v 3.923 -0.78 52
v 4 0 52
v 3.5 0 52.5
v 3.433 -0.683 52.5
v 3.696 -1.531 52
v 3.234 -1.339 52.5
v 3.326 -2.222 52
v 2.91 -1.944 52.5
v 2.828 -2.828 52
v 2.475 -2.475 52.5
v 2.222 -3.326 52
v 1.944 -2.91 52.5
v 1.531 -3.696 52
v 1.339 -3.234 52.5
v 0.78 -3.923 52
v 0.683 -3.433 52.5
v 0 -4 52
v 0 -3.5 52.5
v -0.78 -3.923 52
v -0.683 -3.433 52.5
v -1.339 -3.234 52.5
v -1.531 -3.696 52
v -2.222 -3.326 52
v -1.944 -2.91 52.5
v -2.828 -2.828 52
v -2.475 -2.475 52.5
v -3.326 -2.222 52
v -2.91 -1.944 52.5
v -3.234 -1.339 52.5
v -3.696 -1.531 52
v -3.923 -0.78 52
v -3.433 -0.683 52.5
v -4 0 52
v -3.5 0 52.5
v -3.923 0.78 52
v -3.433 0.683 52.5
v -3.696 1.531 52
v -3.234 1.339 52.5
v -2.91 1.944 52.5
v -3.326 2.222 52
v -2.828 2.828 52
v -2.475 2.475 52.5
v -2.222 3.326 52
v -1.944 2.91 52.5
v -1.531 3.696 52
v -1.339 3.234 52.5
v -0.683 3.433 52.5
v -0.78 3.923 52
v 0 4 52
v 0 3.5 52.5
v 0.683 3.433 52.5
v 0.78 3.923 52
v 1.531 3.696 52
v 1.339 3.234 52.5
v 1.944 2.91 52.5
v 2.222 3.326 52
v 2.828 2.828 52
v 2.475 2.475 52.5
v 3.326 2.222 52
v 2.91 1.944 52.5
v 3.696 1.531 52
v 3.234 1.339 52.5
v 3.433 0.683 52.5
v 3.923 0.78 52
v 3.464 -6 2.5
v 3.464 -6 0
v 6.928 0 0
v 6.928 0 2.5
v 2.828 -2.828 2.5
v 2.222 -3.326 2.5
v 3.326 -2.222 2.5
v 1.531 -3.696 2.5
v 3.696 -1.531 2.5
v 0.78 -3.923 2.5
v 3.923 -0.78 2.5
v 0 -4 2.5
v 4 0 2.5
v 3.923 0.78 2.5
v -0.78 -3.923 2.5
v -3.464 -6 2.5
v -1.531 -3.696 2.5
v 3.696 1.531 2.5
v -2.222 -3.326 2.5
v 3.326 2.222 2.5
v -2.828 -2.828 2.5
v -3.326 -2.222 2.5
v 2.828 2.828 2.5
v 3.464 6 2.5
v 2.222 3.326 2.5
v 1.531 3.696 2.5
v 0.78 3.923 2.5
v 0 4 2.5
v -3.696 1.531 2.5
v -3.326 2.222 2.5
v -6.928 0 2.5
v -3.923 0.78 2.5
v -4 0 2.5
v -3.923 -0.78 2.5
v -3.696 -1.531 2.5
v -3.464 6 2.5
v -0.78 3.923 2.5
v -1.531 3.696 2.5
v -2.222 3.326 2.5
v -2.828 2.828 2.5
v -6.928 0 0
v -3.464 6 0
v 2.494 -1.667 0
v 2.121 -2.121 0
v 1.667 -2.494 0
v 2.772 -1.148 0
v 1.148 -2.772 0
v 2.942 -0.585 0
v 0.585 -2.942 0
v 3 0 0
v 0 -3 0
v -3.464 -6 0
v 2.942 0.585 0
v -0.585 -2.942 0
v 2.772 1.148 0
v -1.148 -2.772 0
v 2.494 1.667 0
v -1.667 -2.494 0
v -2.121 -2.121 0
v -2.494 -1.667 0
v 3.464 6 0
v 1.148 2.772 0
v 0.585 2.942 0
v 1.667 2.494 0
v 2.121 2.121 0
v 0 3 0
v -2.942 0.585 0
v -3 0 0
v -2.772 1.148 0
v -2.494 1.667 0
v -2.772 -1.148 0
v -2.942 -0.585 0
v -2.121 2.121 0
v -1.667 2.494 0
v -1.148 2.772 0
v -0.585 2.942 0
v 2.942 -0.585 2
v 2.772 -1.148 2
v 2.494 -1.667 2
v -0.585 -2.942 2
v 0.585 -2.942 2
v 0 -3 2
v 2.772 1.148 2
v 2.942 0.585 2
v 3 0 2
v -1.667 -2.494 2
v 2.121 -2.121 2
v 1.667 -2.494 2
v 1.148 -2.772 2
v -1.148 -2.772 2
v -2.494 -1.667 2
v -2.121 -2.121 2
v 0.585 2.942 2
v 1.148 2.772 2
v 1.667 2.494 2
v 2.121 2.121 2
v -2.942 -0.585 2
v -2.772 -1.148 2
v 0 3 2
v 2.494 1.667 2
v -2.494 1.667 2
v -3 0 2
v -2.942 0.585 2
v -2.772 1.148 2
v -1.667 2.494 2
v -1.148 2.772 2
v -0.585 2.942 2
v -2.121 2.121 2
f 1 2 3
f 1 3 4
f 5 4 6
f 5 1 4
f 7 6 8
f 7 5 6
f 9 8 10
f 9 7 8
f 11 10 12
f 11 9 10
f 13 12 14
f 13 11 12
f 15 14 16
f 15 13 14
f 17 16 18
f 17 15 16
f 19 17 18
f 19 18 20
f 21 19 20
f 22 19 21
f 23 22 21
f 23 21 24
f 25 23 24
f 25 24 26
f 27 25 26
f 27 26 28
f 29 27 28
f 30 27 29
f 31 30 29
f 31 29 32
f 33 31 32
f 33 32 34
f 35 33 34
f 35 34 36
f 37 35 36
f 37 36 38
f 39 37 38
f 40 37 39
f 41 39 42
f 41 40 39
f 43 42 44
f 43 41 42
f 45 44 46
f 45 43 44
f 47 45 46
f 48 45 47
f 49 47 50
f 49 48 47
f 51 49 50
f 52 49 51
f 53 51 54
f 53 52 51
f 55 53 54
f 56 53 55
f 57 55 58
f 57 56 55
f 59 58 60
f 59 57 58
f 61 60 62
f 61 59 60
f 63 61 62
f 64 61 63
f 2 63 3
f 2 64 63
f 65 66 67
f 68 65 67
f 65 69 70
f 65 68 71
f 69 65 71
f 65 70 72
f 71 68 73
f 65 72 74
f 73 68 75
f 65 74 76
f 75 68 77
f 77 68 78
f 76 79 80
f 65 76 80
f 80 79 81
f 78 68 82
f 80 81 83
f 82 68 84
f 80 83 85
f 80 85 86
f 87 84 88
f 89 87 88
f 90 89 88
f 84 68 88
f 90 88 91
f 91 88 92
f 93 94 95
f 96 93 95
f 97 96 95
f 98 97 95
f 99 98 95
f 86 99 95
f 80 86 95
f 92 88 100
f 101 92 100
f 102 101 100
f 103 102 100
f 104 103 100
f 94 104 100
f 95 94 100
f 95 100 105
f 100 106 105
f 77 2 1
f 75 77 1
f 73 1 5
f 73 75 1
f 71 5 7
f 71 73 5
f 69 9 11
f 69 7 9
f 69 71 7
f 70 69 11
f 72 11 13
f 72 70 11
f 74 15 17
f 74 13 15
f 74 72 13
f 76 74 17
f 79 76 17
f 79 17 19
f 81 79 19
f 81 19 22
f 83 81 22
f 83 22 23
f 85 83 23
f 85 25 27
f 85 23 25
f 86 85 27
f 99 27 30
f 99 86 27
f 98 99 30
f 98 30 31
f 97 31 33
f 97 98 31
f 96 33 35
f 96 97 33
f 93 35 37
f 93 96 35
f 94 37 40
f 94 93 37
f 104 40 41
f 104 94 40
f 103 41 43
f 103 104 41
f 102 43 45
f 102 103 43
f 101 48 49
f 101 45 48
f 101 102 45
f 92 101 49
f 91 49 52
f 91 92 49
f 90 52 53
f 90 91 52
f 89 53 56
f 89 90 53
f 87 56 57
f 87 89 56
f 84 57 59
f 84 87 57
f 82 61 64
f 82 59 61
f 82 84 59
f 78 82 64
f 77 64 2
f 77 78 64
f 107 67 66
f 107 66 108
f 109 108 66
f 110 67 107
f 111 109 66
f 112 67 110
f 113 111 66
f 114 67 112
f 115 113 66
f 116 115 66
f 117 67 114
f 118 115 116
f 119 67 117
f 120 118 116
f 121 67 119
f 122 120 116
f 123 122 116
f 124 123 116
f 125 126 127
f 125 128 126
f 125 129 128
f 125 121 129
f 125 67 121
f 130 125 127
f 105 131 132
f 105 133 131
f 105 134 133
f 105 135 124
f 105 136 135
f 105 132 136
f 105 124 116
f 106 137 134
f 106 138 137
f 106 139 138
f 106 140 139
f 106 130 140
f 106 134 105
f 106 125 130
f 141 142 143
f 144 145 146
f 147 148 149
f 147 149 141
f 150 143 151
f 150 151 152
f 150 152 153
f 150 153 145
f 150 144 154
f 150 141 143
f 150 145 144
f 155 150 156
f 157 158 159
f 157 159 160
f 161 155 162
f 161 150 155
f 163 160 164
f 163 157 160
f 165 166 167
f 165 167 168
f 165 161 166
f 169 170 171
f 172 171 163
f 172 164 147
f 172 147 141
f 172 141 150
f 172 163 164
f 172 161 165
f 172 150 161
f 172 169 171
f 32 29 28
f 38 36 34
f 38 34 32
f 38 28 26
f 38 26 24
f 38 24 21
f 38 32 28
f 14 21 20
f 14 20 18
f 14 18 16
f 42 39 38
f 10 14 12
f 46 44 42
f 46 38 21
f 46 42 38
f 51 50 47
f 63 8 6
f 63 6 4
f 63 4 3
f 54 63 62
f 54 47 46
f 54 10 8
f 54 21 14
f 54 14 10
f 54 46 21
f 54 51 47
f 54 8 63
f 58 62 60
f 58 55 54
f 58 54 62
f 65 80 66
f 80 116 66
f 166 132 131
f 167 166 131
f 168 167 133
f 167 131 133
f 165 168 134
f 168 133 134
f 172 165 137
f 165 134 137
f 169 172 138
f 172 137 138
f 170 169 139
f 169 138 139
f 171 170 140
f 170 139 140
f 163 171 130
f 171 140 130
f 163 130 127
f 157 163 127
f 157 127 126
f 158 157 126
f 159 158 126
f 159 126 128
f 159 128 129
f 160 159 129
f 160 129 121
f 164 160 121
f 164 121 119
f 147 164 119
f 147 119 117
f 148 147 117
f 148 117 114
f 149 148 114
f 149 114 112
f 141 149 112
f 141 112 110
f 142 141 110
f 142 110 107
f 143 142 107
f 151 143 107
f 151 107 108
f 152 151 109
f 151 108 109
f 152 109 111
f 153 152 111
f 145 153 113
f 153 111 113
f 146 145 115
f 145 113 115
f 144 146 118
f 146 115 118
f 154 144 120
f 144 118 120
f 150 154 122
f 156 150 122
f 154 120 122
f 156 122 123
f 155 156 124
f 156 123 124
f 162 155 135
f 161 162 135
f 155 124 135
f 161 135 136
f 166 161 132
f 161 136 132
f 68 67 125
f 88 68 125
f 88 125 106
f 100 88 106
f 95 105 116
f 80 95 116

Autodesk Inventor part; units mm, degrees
ref_plane "YZ Plane" through (0, 0, 0) normal (1, 0, 0) x (0, 1, 0)
ref_plane "XZ Plane" through (0, 0, 0) normal (0, 1, 0) x (-1, 0, 0)
ref_plane "XY Plane" through (0, 0, 0) normal (0, 0, 1) x (1, 0, 0)
sketch "Skizze1" plane through (0, 0, 0) normal (0, 0, 1) x (1, 0, 0)
  circle A0 centre (0, 0) radius 6
  dimension "d0" = 12
extrude "Extrusion1" add sketch "Skizze1" along normal blind 2.5
sketch "Skizze2" plane through (0, 0, 2.5) normal (0, 0, 1) x (1, 0, 0)
  circle A0 centre (0, 0) radius 4
  dimension "d3" = 8
extrude "Extrusion2" add sketch "Skizze2" along normal blind 50
sketch "Skizze3" plane through (0, 0, 0) normal (0, 0, -1) x (-1, 0, 0)
  circle A0 centre (0, 0) radius 3
  dimension "d6" = 6
extrude "Extrusion3" cut sketch "Skizze3" against normal blind 2
sketch "Skizze4" plane through (0, 0, 0) normal (0, 0, -1) x (-1, 0, 0)
  line L0 (3.4641, 6) -> (6.9282, 0)
  line L1 (6.9282, 0) -> (3.4641, -6)
  line L2 (3.4641, -6) -> (-3.4641, -6)
  line L3 (-3.4641, -6) -> (-6.9282, 0)
  line L4 (-6.9282, 0) -> (-3.4641, 6)
  line L5 (-3.4641, 6) -> (3.4641, 6)
  circle A0 centre (0, 0) radius 3 projected
  dimension "d9" = 12
extrude "Extrusion4" add sketch "Skizze4" against normal up to surface (2.5 mm away)
chamfer "Fase1" distance 0.5 angle 45 1 edges at (-4, 0, 52.5)
thread "Gewinde1" size "M8x1.25" class "6g" standard "ANSI Metric M Profile" length 15
properties part number "Bolzen" material "Messing, weicher Gelbton"
